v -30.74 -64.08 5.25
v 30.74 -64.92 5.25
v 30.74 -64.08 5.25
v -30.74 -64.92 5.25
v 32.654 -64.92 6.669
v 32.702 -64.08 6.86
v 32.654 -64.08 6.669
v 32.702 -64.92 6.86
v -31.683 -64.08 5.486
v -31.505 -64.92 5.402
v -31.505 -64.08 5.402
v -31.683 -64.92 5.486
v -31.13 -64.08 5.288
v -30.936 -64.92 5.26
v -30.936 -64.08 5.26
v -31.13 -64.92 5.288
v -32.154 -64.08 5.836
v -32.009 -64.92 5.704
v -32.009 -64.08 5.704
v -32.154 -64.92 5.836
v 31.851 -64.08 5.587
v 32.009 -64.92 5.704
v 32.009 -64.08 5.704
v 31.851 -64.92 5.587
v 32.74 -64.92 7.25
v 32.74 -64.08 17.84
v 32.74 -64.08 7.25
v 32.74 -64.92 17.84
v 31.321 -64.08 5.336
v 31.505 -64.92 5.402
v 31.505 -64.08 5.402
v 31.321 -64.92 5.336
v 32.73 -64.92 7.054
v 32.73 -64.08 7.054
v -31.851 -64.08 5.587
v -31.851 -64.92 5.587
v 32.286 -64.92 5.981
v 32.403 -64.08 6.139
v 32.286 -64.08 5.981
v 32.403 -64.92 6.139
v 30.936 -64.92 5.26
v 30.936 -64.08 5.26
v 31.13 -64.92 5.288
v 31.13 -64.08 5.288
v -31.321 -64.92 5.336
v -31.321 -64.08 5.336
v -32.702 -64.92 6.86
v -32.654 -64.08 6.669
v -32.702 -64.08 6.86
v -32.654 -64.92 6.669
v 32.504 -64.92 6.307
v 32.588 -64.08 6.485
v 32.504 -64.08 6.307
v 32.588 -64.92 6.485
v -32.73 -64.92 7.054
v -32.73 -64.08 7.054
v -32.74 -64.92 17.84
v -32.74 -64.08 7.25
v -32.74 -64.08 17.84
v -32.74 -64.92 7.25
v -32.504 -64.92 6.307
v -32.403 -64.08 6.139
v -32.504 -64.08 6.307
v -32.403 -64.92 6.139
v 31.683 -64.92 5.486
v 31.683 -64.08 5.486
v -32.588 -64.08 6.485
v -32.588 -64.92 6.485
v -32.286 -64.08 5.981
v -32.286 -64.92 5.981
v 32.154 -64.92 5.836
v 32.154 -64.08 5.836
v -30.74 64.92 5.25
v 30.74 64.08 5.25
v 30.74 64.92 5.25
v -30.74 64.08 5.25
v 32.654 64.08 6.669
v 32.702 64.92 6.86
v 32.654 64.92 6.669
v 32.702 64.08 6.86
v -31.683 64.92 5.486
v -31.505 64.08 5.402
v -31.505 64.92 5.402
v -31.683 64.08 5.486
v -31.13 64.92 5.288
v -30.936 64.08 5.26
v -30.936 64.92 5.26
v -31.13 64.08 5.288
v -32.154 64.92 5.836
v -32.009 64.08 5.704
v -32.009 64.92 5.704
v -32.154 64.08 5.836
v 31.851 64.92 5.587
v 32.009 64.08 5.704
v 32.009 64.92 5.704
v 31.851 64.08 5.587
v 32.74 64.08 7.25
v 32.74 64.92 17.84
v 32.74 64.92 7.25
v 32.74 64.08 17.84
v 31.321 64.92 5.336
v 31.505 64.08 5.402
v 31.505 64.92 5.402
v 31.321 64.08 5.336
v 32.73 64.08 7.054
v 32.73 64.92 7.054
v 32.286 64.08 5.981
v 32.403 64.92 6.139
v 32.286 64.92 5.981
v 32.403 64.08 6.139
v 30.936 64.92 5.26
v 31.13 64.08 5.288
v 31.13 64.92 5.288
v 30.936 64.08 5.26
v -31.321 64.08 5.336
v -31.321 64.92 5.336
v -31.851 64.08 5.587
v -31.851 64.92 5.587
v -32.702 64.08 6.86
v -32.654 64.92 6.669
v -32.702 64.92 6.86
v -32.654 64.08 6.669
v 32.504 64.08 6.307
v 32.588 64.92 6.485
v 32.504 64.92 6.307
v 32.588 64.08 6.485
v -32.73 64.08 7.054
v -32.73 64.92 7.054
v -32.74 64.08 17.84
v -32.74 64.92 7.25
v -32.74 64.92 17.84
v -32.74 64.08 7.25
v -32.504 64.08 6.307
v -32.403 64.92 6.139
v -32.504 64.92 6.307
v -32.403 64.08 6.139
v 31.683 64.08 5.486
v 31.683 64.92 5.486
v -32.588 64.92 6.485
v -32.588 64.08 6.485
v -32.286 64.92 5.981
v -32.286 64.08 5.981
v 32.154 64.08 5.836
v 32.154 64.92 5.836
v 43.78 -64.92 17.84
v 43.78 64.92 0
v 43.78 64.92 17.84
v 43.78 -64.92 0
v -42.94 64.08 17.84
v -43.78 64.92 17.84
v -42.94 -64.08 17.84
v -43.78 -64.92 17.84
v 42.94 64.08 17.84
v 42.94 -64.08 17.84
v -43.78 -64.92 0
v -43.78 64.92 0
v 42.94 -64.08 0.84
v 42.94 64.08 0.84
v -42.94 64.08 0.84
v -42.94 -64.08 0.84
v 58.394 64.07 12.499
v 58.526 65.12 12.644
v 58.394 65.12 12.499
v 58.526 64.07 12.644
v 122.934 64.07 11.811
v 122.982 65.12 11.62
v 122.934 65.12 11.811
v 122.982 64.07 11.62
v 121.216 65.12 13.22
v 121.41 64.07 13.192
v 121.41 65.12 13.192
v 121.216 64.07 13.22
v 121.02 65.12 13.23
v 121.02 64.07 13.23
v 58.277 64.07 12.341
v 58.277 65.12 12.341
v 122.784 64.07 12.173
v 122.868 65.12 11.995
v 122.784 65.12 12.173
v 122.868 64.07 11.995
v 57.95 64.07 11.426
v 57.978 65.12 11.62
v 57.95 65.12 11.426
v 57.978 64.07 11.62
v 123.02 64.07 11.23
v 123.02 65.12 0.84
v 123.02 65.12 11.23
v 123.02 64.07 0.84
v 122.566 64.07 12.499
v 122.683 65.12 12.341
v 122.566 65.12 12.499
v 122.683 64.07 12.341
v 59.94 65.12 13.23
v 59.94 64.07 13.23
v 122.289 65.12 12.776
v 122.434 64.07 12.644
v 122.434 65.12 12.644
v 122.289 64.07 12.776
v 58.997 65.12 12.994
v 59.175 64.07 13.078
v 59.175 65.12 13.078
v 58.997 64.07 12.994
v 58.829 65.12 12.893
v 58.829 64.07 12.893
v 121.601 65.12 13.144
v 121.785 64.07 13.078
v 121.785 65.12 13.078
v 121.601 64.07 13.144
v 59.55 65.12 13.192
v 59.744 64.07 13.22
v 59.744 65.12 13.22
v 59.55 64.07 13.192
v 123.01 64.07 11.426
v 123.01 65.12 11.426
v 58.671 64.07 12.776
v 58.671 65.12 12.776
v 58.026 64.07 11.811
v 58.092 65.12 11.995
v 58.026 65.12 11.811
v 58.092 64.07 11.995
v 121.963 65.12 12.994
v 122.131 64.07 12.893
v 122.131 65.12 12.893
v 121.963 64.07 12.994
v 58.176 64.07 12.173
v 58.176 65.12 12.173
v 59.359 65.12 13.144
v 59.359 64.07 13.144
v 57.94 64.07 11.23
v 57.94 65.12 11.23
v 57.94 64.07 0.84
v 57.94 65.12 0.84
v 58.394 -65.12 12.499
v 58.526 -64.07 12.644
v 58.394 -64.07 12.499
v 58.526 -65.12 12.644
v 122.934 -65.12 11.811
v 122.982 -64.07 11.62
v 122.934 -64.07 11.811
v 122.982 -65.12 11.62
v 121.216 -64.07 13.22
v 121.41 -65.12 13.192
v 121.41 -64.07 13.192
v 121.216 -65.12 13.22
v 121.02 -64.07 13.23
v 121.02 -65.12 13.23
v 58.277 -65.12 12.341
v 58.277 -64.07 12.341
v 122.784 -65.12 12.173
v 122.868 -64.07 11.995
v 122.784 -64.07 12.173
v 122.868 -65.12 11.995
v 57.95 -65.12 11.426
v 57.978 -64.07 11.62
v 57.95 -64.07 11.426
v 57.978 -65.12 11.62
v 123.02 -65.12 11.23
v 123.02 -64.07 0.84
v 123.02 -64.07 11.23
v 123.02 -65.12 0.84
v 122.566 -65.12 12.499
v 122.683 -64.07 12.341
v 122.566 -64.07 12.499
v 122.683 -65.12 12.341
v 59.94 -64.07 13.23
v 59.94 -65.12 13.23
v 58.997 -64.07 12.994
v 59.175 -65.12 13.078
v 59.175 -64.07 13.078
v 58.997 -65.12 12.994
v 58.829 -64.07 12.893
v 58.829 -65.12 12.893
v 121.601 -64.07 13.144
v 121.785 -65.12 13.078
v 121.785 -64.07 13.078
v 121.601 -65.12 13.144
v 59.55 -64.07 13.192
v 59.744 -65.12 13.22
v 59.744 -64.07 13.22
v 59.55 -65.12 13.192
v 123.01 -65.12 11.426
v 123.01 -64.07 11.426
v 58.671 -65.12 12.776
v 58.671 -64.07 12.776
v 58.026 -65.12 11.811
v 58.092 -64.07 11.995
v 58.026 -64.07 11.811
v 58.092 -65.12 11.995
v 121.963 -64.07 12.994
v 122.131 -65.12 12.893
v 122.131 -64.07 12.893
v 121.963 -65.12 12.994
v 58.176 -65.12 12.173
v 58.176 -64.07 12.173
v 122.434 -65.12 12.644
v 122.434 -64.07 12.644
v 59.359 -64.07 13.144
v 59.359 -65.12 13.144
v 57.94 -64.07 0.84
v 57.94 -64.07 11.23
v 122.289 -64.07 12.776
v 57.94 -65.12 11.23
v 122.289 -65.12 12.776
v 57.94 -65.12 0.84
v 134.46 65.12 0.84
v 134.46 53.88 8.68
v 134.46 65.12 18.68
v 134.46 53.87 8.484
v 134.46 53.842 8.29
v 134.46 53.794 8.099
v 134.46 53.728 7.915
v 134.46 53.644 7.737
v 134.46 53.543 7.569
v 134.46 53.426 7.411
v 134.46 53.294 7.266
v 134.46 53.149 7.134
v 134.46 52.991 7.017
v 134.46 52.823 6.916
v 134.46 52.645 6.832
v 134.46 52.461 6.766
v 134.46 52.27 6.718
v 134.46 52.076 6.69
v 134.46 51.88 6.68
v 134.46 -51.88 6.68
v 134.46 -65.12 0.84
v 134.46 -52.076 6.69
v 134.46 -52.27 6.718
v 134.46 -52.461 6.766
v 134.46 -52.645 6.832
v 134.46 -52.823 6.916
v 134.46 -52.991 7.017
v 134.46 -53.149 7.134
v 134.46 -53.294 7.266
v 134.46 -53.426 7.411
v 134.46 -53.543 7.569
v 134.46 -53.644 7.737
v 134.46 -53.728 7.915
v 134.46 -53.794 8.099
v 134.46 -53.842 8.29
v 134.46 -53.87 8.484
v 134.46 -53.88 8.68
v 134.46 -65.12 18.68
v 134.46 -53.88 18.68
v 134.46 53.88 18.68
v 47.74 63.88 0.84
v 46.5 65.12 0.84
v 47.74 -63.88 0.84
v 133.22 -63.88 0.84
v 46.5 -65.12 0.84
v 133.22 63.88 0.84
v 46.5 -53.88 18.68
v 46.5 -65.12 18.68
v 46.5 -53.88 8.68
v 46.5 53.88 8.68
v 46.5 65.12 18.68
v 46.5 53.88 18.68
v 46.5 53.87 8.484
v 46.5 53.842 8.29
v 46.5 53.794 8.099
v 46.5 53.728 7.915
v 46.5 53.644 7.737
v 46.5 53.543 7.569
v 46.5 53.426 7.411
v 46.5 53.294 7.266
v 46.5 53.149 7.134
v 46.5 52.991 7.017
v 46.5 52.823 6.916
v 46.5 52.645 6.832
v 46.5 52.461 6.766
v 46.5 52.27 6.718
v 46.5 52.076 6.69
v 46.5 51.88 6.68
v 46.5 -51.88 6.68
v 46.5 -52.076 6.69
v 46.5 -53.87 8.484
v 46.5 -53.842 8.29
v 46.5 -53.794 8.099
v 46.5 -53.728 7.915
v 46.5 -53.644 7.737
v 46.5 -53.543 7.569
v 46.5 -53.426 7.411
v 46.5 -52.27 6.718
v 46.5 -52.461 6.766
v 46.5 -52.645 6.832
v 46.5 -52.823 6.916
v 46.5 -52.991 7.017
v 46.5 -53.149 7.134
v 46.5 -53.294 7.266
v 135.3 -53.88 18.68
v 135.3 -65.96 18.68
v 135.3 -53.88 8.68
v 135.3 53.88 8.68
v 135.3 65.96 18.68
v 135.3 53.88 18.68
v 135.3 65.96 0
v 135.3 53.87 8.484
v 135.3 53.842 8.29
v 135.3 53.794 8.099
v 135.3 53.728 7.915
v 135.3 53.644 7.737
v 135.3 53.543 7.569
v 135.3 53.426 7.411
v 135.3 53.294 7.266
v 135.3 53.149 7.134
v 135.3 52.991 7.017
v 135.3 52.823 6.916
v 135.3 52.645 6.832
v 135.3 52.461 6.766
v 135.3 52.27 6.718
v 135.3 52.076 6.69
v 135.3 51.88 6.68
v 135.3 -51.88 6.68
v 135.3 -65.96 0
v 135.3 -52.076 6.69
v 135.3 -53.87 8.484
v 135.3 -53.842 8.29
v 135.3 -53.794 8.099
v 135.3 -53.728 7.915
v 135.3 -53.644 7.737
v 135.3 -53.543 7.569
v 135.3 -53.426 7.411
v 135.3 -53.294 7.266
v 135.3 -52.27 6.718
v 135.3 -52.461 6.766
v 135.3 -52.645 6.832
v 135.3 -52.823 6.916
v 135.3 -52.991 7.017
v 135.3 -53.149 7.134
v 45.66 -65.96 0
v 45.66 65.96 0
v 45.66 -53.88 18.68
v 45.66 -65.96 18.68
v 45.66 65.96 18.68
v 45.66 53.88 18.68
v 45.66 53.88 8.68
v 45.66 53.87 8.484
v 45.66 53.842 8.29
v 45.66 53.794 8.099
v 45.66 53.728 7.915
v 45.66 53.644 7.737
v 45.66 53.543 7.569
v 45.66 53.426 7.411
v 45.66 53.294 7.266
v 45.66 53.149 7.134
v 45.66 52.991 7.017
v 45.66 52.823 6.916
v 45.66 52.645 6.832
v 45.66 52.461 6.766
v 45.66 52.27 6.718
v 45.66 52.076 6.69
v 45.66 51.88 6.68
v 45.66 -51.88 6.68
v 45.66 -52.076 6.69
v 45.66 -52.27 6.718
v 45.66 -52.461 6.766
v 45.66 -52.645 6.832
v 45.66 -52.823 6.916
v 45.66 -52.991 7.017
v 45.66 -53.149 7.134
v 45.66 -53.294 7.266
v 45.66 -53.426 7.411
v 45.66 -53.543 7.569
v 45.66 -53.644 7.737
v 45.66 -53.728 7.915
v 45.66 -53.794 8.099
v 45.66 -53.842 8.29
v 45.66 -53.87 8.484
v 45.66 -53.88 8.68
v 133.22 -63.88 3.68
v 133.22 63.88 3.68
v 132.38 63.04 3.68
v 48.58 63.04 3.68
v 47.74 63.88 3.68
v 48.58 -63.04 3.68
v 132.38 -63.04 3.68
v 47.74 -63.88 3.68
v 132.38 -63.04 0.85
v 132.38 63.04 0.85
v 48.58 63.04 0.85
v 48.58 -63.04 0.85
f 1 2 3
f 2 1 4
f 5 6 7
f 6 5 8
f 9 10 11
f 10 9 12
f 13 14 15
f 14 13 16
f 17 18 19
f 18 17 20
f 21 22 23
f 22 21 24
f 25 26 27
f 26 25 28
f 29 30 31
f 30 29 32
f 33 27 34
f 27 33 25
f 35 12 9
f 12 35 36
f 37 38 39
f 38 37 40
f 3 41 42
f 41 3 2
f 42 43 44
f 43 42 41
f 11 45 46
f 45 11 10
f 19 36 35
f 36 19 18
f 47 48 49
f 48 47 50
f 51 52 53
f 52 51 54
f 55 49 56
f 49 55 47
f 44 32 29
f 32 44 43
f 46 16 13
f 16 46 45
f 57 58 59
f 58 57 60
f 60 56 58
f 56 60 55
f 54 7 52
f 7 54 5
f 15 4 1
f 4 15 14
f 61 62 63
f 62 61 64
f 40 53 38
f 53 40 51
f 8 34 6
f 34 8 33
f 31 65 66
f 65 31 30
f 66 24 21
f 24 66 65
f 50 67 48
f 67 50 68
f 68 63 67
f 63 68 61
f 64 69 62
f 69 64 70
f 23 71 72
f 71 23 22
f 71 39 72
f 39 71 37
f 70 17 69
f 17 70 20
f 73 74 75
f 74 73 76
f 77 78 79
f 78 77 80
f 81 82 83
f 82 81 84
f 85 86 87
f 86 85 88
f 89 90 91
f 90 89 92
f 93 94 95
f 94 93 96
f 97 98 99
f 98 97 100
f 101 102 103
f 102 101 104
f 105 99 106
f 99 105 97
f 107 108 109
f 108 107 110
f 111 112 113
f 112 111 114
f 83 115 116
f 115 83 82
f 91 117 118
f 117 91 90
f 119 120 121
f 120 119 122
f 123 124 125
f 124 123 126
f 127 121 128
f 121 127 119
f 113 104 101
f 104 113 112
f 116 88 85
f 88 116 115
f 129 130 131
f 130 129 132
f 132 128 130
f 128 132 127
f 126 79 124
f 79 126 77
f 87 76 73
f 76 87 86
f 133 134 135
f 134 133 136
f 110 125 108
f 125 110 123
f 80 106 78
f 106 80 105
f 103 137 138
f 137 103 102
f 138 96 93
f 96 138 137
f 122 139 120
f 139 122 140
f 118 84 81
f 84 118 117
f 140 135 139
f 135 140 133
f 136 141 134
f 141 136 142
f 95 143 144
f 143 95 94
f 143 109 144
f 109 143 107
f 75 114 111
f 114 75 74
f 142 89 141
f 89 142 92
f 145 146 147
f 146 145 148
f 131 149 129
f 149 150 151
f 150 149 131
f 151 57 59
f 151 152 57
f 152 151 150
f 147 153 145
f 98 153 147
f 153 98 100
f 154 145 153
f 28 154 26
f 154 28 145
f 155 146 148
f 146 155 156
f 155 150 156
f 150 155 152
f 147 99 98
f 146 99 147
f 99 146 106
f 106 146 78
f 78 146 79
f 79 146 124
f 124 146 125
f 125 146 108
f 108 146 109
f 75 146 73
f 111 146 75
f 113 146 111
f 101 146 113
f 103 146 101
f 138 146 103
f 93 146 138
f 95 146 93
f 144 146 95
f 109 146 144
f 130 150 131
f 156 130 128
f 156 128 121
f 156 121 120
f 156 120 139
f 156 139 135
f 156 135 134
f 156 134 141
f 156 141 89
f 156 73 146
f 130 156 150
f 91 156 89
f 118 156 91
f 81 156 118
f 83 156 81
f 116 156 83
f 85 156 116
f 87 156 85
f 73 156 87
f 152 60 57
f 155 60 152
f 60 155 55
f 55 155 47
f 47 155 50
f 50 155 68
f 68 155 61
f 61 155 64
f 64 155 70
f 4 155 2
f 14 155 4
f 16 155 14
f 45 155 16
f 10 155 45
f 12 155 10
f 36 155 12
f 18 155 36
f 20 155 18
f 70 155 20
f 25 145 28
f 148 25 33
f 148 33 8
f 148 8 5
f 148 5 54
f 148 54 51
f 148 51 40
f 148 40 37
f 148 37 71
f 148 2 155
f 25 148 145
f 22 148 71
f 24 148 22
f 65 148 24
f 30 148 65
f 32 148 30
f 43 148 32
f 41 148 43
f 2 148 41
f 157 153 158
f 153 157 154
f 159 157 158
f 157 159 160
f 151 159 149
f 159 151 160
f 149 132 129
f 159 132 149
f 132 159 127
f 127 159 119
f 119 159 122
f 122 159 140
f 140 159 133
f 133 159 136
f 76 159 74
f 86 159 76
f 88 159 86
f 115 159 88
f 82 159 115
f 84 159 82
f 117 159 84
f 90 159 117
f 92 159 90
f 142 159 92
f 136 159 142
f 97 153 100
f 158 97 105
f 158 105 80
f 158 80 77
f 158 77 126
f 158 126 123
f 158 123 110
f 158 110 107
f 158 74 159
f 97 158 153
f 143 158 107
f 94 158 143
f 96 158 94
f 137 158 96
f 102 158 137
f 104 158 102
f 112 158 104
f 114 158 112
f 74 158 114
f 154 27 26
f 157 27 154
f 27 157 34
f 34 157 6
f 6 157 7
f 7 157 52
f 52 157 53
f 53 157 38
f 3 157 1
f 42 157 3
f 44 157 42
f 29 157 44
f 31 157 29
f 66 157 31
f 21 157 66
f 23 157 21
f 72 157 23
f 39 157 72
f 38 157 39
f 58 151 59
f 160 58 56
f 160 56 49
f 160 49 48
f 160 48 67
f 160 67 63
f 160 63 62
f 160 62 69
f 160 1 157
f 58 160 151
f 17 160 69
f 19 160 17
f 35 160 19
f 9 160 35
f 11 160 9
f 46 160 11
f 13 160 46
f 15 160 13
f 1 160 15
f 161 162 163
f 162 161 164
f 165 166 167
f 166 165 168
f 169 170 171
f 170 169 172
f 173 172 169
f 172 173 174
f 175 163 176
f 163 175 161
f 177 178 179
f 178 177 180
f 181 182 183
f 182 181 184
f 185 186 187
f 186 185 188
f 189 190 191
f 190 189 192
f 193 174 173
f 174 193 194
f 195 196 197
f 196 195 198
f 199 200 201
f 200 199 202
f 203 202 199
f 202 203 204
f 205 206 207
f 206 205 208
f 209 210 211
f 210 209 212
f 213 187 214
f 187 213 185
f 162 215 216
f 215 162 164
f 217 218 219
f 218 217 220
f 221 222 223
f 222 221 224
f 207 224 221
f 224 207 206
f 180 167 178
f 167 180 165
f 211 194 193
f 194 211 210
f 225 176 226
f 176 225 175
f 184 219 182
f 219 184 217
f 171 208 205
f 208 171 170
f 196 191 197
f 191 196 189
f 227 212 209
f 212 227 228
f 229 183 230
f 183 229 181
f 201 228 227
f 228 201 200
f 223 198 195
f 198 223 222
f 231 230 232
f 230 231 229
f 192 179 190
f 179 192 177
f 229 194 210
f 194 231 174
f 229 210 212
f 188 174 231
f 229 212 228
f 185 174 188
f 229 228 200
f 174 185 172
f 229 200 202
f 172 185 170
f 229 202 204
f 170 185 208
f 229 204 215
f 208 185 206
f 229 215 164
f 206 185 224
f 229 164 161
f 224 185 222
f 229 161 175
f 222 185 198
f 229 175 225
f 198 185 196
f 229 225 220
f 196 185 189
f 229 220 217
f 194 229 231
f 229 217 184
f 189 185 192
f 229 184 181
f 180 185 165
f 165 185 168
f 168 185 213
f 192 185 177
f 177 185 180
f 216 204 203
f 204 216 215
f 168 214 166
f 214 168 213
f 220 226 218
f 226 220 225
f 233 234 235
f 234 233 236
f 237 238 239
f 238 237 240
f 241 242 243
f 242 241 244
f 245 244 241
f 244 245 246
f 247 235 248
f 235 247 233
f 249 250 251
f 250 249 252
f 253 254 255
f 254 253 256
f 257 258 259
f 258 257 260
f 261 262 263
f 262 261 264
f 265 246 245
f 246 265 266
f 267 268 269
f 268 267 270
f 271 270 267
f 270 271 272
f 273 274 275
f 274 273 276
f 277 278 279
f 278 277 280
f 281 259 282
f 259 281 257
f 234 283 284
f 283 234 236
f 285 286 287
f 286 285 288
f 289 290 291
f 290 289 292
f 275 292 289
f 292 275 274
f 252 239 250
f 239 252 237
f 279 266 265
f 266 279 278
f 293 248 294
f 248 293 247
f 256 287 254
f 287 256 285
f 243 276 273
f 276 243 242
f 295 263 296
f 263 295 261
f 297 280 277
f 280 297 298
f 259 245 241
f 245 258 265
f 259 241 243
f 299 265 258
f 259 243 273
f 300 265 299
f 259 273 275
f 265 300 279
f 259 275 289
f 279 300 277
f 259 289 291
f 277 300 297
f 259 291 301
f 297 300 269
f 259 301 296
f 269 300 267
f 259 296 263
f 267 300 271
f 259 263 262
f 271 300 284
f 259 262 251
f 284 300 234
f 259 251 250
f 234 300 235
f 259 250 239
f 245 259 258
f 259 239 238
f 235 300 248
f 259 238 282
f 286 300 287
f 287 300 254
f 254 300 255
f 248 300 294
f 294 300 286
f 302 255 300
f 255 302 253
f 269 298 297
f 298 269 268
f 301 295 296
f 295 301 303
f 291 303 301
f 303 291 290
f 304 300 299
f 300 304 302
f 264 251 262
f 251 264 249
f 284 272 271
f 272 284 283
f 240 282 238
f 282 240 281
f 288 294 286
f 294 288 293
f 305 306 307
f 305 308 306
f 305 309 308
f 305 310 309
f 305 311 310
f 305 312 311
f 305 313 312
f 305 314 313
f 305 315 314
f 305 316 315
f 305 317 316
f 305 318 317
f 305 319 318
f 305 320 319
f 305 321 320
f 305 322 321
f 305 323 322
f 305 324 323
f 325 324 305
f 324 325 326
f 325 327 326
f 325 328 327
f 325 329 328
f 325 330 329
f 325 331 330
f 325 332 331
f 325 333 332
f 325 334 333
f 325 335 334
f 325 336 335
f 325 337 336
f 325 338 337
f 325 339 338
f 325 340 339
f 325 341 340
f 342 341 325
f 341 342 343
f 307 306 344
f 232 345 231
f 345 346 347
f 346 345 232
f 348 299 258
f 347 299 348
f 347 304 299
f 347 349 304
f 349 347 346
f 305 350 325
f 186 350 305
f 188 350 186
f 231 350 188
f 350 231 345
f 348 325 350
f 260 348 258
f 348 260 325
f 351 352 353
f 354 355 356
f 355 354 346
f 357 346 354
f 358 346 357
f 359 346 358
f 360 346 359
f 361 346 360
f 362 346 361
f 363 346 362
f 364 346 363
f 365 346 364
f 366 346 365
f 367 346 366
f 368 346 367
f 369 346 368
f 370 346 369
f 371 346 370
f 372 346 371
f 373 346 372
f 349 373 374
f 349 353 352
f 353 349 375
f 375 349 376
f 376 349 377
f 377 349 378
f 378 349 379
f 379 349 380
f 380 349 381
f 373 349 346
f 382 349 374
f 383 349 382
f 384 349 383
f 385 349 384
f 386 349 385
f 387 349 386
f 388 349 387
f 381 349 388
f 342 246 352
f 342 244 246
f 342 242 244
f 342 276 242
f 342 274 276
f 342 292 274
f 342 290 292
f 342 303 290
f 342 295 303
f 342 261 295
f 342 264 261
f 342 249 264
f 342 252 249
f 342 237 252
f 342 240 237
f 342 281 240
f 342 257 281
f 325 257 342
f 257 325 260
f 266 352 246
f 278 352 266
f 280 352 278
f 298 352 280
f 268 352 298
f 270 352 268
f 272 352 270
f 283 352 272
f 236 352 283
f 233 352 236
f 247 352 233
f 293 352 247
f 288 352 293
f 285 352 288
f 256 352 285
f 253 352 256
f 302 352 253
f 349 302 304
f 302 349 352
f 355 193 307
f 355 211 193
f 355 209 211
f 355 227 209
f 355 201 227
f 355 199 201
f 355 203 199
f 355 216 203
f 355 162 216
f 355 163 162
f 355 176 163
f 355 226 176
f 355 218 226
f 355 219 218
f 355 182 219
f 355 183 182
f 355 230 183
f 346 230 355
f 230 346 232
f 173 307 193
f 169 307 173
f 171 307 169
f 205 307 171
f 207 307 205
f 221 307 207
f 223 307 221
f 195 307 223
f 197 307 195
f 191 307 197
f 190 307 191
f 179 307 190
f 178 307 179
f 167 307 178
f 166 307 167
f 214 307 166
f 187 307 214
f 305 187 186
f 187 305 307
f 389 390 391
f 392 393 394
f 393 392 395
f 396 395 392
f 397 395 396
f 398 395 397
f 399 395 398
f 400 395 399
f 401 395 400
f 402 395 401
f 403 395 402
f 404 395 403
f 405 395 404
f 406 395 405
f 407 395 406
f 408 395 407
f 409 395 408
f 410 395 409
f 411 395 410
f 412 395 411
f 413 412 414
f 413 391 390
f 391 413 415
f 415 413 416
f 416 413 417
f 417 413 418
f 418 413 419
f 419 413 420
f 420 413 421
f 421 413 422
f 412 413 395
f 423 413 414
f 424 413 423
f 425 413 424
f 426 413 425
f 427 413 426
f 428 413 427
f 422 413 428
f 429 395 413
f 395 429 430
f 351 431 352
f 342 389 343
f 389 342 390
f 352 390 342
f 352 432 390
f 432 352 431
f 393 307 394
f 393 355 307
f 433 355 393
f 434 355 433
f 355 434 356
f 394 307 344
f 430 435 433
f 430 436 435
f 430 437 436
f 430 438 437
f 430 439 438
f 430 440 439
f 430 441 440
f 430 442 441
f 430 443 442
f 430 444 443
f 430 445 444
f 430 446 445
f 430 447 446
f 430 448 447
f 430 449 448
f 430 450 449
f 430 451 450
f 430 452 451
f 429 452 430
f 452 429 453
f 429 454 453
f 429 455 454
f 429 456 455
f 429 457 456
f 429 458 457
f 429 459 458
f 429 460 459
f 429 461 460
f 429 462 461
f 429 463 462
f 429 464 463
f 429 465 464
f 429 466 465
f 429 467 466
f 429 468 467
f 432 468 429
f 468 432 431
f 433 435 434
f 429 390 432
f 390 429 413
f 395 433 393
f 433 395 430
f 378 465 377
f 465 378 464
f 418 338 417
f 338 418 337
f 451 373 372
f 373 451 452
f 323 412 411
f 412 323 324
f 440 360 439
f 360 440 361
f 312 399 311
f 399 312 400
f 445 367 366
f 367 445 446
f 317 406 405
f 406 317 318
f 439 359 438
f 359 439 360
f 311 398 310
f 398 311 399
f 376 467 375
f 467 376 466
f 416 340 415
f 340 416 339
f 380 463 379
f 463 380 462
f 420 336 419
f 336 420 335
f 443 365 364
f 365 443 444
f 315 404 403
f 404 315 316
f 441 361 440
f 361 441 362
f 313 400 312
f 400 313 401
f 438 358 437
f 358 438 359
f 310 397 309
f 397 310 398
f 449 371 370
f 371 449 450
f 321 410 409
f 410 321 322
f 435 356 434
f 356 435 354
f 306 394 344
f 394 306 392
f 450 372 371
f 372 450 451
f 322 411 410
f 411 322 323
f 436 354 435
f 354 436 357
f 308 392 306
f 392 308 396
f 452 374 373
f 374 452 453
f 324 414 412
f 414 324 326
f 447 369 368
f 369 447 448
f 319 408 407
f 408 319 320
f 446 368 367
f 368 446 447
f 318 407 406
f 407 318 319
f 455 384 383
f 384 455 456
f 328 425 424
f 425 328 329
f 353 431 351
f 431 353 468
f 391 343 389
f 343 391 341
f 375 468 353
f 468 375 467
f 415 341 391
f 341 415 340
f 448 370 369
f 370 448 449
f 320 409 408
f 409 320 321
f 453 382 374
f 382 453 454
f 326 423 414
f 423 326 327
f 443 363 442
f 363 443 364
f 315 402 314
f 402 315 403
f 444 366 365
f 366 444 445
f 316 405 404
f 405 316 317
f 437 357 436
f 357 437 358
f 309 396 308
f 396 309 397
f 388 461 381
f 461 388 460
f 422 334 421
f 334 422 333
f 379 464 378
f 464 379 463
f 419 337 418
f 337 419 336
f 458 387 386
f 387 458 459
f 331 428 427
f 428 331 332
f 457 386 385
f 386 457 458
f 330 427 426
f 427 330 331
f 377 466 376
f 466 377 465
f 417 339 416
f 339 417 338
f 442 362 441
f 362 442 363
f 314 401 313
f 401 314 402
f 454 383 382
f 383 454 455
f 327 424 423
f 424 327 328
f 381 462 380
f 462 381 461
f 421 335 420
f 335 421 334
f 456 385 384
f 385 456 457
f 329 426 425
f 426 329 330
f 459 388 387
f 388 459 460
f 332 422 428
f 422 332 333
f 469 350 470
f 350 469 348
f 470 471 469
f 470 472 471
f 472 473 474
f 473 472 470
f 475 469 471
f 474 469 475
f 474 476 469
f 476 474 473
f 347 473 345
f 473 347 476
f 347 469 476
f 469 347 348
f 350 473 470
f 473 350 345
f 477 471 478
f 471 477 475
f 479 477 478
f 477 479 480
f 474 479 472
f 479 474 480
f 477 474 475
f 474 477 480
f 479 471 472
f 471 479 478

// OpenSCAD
$fn = 64;

plate_max_height = 17;

// SLAS plate footprint dimensions
slas_plate_width = 85.48;
slas_plate_length = 127.76;
slas_plate_flange_width = 1.27;
slas_plate_flange_height = 2.41; // short flange

base_thickness = 0.42;

minm = 0.01;

inside_tolerance = 0.2;
bottom_thickness = 2*base_thickness;
wall_thickness = 2*base_thickness;

module extruded_rounded_rectangle(w, h, d, r) {
    hull() {
        translate([-w/2+r, -h/2+r, 0]) cylinder(r=r, h=d, center=true);
        translate([w/2-r, -h/2+r, 0]) cylinder(r=r, h=d, center=true);
        translate([-w/2+r, h/2-r, 0]) cylinder(r=r, h=d, center=true);
        translate([w/2-r, h/2-r, 0]) cylinder(r=r, h=d, center=true);
    }
}

module bottom(neg=false) {

eh = neg ? inside_tolerance : 0;
em = neg ? minm : 0;

difference()
{
translate([-(slas_plate_width + 2*inside_tolerance + 2*wall_thickness + 2*eh)/2, 
    -(slas_plate_length + 2*inside_tolerance + 2*wall_thickness + 2*eh)/2, -em])
cube([slas_plate_width + 2*inside_tolerance + 2*wall_thickness + 2*eh, 
    slas_plate_length + 2*inside_tolerance + 2*wall_thickness + 2*eh, 
    plate_max_height + bottom_thickness + em]);

if (neg==false) {
translate([-(slas_plate_width + 2*inside_tolerance)/2, 
    -(slas_plate_length + 2*inside_tolerance)/2, 
    bottom_thickness - em])
cube([slas_plate_width + 2*inside_tolerance, 
    slas_plate_length + 2*inside_tolerance, 
    plate_max_height + minm + em]);
}

for (i=[-1:2:1]) {
translate([0,i*(slas_plate_length/2+inside_tolerance+wall_thickness/2+eh/2),plate_max_height/2 + slas_plate_flange_height + bottom_thickness + 2 + eh])
rotate([90, 0, 0])
color("blue")
extruded_rounded_rectangle(slas_plate_width-20-2*eh, plate_max_height, wall_thickness+2*minm+eh, 2);
}
}

}

// bottom(neg=false);
module top() {
difference() {
    translate([-(slas_plate_width + 2*inside_tolerance + 4*wall_thickness + 2*inside_tolerance)/2, 
    -(slas_plate_length + 2*inside_tolerance + 4*wall_thickness + 2*inside_tolerance)/2, 0])
    cube([slas_plate_width + 2*inside_tolerance + 4*wall_thickness + 2*inside_tolerance, 
    slas_plate_length + 2*inside_tolerance + 4*wall_thickness + 2*inside_tolerance, 
    plate_max_height + bottom_thickness*2]);
    
    bottom(neg=true);
    translate([0,0,plate_max_height/2 - 5])
    rotate([0, 90, 0])
    extruded_rounded_rectangle(plate_max_height, slas_plate_length-20, 2*slas_plate_width, 2);
}

tlh=2;
translate([-(slas_plate_width)/2, 
    -(slas_plate_length)/2, 
    plate_max_height-tlh])
difference() {
cube([slas_plate_width, 
    slas_plate_length, 
    tlh+bottom_thickness]);
translate([wall_thickness, wall_thickness, -minm])
cube([slas_plate_width - wall_thickness*2, 
    slas_plate_length - wall_thickness*2, 
    tlh+bottom_thickness]);
}
}

bottom();

translate([slas_plate_width+5,0,plate_max_height+bottom_thickness*2])
rotate([180,0,0])
top();
